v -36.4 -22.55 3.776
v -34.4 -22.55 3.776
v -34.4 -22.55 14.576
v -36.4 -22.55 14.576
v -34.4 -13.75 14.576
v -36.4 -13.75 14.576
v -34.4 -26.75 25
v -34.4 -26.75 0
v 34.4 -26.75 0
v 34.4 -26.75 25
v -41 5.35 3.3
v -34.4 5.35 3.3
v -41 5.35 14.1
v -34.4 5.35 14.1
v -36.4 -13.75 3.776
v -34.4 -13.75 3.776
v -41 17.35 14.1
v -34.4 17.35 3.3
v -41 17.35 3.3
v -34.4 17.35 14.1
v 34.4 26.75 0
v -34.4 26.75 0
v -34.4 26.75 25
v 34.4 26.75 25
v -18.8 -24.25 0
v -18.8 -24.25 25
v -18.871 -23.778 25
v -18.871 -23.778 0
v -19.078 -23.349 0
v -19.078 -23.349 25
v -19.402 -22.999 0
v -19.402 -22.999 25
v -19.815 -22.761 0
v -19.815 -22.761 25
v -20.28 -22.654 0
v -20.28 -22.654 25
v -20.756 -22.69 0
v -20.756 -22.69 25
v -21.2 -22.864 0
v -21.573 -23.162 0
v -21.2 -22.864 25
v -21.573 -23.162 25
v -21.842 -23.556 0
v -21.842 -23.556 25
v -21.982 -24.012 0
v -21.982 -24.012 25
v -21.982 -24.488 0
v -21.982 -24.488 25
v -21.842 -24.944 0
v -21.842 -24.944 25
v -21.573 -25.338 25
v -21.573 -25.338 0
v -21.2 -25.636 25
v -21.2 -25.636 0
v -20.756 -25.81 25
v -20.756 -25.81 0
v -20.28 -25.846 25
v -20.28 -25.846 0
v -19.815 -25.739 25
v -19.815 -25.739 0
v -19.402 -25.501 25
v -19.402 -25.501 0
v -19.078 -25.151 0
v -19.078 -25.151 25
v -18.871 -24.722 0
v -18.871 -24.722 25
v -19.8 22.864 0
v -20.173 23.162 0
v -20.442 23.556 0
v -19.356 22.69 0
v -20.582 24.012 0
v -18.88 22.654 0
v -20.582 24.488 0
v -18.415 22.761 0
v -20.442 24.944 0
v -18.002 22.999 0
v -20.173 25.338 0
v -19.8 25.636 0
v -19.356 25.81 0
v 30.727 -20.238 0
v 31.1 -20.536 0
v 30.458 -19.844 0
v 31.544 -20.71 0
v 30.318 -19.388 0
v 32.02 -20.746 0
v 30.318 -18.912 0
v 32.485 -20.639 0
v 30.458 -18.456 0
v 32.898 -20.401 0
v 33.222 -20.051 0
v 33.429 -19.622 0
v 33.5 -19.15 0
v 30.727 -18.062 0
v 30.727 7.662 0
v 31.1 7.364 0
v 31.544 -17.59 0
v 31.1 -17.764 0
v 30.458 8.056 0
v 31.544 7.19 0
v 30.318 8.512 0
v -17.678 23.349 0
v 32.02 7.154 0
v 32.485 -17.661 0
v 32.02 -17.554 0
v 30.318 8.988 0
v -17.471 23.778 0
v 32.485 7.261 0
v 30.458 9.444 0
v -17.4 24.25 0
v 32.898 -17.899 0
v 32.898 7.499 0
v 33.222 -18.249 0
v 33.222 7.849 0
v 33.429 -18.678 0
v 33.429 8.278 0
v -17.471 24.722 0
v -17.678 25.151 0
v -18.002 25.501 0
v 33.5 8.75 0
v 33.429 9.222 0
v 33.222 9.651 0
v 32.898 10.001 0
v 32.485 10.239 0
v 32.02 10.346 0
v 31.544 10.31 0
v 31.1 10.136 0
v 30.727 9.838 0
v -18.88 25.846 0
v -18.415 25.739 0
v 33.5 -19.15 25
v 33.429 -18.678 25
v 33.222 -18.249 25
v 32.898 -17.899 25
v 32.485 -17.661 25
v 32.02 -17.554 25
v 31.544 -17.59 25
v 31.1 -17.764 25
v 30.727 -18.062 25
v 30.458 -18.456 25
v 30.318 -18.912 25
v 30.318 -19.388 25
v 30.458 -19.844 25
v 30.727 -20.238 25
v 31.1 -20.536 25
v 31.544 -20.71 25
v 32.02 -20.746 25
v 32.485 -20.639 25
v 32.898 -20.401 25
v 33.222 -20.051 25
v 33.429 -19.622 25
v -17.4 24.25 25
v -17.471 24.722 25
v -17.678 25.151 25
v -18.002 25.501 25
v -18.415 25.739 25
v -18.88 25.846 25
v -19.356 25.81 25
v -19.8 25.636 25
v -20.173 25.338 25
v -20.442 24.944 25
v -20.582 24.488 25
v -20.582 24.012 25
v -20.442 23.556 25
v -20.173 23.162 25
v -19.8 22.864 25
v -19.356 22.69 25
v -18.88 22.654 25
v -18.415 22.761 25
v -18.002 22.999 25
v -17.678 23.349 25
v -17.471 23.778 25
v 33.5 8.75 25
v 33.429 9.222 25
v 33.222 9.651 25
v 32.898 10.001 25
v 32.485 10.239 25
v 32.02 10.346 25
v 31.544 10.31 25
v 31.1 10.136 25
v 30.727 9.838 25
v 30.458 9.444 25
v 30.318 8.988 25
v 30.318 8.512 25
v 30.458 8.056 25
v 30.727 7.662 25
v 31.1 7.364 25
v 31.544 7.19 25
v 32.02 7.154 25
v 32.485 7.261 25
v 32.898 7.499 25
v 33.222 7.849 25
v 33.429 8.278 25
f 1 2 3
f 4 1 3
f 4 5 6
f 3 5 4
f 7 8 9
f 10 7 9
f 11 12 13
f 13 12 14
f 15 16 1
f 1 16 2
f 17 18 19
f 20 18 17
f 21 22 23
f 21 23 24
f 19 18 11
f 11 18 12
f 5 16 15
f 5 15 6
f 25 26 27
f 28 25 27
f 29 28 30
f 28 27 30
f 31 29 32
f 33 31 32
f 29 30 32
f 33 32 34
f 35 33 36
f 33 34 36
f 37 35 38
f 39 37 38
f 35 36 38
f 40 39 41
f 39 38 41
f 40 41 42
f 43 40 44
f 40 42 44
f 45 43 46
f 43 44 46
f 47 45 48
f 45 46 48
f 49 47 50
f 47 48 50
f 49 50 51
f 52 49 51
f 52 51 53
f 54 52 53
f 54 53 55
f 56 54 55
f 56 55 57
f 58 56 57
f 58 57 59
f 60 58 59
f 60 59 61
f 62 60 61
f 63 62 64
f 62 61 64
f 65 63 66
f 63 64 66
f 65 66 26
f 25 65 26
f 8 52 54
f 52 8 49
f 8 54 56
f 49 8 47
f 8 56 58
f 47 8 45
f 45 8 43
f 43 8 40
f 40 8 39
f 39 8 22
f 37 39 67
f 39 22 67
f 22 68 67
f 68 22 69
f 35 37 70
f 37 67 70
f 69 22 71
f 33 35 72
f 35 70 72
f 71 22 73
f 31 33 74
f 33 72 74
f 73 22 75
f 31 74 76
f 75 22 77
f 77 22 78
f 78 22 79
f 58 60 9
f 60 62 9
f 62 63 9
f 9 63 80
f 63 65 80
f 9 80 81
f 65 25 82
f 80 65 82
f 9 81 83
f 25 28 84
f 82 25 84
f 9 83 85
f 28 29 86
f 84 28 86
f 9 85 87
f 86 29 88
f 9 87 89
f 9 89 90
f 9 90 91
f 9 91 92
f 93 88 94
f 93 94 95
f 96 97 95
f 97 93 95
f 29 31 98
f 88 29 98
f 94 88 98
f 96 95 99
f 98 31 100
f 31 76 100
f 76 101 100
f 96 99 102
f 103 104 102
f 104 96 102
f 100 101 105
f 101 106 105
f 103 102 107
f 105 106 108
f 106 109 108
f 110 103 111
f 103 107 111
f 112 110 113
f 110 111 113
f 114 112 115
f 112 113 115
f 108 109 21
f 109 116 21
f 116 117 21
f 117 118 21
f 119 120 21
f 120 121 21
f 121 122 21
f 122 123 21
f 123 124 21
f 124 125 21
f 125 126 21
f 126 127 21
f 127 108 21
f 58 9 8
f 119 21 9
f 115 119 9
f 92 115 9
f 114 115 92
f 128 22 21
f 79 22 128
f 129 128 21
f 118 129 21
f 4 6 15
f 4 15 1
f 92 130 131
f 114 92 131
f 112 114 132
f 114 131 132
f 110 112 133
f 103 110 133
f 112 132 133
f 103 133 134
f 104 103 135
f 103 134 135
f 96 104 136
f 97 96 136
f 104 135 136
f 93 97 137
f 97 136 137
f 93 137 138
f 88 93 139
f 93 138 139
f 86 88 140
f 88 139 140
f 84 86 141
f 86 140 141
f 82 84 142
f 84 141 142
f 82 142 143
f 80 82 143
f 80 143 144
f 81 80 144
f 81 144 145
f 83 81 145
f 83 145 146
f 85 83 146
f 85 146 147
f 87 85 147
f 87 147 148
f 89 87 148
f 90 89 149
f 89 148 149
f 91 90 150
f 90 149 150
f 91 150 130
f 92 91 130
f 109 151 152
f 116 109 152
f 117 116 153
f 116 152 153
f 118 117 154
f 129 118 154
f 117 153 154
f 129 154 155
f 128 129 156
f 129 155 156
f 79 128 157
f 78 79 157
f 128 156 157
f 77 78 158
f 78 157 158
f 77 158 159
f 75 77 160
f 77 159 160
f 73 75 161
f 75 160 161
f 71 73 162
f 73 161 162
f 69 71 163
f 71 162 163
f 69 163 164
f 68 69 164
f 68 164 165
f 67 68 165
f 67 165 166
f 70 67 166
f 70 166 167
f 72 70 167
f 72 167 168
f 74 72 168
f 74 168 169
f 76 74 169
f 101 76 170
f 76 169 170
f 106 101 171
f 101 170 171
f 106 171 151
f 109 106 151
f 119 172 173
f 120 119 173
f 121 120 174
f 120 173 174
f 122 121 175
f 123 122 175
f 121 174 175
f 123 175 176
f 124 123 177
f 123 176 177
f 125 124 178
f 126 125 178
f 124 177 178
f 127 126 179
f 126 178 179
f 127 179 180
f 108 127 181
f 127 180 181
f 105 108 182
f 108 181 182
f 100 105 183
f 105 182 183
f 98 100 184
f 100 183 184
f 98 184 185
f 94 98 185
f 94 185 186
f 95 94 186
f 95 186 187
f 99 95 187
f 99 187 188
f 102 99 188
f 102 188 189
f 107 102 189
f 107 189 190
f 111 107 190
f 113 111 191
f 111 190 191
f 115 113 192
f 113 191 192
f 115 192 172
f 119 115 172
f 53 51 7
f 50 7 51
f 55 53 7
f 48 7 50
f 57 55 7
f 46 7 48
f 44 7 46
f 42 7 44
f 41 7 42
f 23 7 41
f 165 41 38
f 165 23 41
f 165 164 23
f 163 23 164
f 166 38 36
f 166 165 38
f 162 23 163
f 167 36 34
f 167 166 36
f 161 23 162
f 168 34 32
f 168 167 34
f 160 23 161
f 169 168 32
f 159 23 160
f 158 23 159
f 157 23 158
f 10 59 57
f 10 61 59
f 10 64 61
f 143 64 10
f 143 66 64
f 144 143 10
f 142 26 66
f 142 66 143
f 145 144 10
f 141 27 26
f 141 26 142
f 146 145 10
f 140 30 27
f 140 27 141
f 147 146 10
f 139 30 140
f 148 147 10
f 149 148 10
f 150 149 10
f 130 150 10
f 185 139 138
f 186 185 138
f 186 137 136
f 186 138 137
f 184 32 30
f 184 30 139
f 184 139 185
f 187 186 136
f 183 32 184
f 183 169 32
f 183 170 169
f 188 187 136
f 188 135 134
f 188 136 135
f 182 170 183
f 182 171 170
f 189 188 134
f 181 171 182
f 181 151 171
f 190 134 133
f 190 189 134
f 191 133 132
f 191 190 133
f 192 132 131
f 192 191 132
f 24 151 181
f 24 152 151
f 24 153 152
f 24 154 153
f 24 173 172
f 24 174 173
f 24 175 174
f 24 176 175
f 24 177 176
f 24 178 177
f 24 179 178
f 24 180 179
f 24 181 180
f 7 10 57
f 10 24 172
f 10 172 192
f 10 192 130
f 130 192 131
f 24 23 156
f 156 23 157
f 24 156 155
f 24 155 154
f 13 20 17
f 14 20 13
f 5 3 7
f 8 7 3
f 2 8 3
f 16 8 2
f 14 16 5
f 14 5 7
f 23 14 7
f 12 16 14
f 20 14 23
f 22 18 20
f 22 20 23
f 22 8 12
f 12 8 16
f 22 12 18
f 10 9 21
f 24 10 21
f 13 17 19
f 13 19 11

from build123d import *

# Parameters (mm, degrees)
F0_W     = 68.8
F0_H     = 53.5
F1_DEPTH = 25
F2_R     = 1.6
F3_DEPTH = 25
F4_W     = 12
F4_H     = 10.8
F5_DEPTH = 6.6
F6_W     = 8.8
F6_H     = 10.8
F7_DEPTH = 2


with BuildPart() as f1:
    # F0 (on Top) → F1 (new body)
    with BuildSketch(Plane.XY):
        Rectangle(F0_W, F0_H)
    extrude(amount=F1_DEPTH)

    # F2 (on face) → F3 (cut)
    with BuildSketch(Plane.XY.offset(25)):
        with Locations((-19, 24.25)):
            Circle(F2_R)
        with Locations((31.9, 8.75)):
            Circle(F2_R)
        with Locations((-20.4, -24.25)):
            Circle(F2_R)
        with Locations((31.9, -19.15)):
            Circle(F2_R)
    extrude(amount=-F3_DEPTH, mode=Mode.SUBTRACT)

    # F4 (on face) → F5 (join)
    with BuildSketch(Plane(origin=(-34.4, 0, 0), x_dir=(0, -1, 0), z_dir=(-1, 0, 0))):
        with Locations((-11.35, 8.7)):
            Rectangle(F4_W, F4_H)
    extrude(amount=F5_DEPTH)

    # F6 (on face) → F7 (join)
    with BuildSketch(Plane(origin=(-34.4, 0, 0), x_dir=(0, -1, 0), z_dir=(-1, 0, 0))):
        with Locations((18.15, 9.176207)):
            Rectangle(F6_W, F6_H)
    extrude(amount=F7_DEPTH)


solid = f1.part
